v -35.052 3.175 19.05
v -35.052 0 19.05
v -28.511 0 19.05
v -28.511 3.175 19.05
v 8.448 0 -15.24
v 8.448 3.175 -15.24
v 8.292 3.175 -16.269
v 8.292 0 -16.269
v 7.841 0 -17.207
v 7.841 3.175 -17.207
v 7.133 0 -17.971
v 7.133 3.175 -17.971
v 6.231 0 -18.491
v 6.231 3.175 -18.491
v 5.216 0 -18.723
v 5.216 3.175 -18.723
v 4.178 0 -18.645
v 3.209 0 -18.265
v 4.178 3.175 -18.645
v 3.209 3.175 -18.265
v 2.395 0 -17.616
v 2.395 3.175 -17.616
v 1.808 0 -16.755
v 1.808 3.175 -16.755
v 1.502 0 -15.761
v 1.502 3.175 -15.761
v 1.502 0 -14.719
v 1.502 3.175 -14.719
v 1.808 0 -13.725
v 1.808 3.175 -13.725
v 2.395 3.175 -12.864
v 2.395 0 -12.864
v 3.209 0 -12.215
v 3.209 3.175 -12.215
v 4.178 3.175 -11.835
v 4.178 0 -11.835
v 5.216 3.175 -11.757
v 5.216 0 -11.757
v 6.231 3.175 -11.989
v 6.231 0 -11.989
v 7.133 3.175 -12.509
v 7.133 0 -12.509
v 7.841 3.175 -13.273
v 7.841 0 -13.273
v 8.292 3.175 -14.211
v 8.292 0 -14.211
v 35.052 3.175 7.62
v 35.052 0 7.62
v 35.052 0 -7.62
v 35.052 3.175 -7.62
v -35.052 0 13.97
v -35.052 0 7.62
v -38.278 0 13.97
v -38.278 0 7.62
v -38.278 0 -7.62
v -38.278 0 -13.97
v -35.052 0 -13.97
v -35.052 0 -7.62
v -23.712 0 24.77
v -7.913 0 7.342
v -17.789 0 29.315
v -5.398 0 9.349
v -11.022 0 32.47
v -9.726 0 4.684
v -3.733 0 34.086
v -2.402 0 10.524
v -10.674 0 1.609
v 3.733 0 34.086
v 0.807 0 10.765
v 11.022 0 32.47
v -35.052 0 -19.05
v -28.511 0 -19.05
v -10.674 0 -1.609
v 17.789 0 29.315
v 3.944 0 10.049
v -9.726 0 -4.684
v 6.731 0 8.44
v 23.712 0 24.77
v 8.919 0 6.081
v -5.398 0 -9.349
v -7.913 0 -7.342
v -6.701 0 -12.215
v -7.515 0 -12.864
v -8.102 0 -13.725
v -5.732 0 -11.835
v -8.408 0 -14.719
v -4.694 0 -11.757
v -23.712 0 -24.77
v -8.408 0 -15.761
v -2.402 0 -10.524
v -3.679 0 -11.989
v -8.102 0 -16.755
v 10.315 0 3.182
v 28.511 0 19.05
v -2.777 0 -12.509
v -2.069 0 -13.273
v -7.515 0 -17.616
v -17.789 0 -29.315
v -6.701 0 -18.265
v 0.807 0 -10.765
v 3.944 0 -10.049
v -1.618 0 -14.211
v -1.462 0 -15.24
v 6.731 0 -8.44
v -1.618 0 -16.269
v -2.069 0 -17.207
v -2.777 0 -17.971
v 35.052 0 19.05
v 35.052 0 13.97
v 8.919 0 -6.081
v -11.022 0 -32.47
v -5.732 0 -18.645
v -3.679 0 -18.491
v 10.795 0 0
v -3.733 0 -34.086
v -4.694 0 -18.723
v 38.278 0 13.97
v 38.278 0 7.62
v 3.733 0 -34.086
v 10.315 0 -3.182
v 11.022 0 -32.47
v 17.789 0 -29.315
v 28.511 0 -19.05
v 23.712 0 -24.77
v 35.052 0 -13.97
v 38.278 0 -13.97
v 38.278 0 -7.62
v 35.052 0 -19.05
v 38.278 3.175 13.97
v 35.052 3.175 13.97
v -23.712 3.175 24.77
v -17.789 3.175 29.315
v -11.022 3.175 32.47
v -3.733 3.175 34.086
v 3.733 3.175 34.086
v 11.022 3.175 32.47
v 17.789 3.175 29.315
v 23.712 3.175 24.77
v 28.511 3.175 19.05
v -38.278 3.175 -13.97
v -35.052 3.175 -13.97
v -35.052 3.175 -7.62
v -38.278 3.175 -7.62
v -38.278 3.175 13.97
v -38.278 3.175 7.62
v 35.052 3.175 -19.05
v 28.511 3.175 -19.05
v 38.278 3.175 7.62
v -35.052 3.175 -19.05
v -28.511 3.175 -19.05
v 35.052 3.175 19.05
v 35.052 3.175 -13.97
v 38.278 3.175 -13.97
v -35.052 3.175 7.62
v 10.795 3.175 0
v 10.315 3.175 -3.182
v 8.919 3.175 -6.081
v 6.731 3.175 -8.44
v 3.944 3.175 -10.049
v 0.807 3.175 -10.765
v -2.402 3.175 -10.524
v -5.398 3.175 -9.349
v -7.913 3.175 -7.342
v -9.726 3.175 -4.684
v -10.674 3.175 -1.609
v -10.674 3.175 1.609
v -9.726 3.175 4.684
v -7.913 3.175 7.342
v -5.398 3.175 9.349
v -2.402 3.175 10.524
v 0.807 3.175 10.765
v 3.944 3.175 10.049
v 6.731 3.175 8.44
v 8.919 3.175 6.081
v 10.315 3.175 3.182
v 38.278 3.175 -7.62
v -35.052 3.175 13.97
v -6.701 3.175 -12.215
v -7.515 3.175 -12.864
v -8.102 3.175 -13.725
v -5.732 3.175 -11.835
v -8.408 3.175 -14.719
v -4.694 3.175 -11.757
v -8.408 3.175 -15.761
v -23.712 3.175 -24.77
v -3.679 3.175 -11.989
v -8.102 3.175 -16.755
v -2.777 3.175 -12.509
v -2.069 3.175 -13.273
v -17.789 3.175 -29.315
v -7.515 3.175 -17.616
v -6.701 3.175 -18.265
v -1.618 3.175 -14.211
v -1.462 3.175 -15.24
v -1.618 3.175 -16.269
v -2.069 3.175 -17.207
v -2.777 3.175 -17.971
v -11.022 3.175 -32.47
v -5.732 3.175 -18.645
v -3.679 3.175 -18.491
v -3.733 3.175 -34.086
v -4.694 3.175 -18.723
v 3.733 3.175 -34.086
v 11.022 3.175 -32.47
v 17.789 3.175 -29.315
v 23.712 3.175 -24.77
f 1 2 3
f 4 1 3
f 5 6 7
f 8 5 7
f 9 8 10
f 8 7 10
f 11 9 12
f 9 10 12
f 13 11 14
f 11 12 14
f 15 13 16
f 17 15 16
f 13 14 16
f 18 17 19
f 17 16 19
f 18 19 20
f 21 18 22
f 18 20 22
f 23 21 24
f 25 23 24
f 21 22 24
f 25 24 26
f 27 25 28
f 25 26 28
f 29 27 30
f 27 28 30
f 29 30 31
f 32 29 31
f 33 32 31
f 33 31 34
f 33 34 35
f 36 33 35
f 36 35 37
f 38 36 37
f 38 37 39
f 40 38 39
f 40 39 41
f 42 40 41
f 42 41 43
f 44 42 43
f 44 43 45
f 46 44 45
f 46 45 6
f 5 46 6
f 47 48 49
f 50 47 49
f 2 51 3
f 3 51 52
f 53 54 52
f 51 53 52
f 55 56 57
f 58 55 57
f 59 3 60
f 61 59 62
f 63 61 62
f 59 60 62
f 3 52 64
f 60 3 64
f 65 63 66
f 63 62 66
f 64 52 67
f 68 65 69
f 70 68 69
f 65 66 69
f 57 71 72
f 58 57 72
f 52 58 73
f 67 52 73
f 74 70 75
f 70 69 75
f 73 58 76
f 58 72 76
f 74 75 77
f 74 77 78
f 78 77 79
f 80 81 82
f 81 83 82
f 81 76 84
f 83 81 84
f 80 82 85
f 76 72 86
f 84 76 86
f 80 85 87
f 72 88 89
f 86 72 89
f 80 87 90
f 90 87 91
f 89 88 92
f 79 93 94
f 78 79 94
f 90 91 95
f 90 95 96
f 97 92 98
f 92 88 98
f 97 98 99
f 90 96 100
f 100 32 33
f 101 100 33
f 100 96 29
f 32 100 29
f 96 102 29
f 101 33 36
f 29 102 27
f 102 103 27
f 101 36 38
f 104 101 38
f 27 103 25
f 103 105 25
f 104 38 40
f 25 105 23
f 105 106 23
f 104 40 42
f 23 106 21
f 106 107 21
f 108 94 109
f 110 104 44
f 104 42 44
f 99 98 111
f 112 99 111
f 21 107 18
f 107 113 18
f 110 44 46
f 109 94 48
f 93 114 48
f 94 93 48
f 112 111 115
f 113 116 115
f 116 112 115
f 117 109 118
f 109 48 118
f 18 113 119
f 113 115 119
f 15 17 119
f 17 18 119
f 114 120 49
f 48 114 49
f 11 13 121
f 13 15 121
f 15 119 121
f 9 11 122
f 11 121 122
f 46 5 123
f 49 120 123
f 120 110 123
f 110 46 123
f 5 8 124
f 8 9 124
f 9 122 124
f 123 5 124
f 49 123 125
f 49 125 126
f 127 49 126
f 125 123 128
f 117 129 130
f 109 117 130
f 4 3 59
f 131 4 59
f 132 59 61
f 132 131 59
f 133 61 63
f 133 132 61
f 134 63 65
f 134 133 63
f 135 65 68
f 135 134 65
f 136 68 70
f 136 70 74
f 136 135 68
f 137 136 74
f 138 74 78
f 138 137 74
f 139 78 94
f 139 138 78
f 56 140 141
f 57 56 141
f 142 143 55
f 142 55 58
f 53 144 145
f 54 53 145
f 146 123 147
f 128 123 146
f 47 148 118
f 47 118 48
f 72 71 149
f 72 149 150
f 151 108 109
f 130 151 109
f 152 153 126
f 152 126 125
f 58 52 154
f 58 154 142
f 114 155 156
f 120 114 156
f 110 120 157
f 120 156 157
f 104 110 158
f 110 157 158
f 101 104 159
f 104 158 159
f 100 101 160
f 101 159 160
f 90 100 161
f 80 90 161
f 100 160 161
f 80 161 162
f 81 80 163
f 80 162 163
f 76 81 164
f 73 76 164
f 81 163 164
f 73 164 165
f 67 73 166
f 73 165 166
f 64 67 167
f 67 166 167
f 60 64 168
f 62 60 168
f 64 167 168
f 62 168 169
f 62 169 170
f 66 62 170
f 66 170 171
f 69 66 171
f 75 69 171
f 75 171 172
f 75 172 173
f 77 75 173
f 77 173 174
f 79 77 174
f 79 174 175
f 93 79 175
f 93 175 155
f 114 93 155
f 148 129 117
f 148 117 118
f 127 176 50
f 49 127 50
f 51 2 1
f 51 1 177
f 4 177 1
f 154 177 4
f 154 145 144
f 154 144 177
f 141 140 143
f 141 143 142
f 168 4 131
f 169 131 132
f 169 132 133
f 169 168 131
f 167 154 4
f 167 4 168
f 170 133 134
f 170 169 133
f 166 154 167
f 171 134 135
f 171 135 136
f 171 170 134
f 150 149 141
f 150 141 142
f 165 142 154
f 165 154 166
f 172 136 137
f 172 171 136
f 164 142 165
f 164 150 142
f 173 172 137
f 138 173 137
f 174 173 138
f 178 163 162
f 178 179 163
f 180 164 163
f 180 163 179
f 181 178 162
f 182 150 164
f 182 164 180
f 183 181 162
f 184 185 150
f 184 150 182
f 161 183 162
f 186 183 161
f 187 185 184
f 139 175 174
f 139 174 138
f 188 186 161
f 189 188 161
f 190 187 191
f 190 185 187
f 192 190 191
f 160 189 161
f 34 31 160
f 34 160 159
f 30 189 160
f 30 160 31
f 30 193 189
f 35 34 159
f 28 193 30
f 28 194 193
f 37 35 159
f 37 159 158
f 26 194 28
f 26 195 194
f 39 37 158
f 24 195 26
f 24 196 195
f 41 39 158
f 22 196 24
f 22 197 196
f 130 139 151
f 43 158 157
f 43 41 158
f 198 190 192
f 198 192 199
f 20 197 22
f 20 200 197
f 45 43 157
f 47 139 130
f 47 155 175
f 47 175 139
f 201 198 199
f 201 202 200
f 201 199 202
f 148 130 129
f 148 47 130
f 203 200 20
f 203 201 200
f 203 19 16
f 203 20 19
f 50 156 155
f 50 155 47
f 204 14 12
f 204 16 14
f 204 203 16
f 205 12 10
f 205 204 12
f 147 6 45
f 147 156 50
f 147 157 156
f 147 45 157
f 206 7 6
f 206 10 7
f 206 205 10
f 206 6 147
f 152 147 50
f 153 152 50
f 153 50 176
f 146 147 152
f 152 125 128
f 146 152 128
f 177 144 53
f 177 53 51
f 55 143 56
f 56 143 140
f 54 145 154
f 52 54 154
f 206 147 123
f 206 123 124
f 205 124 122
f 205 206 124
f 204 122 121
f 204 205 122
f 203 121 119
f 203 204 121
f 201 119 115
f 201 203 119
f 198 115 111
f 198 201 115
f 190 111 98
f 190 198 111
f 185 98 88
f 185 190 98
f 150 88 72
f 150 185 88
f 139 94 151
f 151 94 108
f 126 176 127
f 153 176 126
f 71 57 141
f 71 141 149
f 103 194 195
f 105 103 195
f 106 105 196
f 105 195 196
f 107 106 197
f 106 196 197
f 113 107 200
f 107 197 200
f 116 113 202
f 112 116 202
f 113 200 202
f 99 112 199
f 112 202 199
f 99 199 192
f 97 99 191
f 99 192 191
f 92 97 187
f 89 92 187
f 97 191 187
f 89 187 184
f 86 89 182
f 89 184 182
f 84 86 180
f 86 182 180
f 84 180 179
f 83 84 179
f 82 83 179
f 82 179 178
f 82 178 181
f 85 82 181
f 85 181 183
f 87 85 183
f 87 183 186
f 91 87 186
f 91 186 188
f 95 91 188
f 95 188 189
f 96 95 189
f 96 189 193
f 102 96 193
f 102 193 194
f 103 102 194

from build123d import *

# Parameters (mm, degrees)
SKETCH1_W                  = 70.104
SKETCH1_H                  = 38.1
RECTANGULAR_BASE_DEPTH     = 3.175
SKETCH2_R                  = 34.29
CIRCULAR_BASE_ADD_ON_DEPTH = 3.175
SKETCH4_W                  = 3.2258
SKETCH4_H                  = 6.35
TAB_DEPTH                  = 3.175
SKETCH5_R                  = 10.795
CUT_EXTRUDE1_DEPTH         = 4.175
SKETCH6_R                  = 3.4925
CUT_FOR_SCREW_ACCESS_DEPTH = 4.175


with BuildPart() as part:
    # Sketch1 → rectangular base (new body)
    with BuildSketch(Plane(origin=(0, 0, 0), x_dir=(1, 0, 0), z_dir=(0, 1, 0))):
        Rectangle(SKETCH1_W, SKETCH1_H)
    extrude(amount=RECTANGULAR_BASE_DEPTH)

    # Sketch2 → circular base add on (add)
    with BuildSketch(Plane(origin=(0, 3.175, 0), x_dir=(1, 0, 0), z_dir=(0, 1, 0))):
        Circle(SKETCH2_R)
    extrude(amount=-CIRCULAR_BASE_ADD_ON_DEPTH)

    # Sketch4 → tab (add)
    with BuildSketch(Plane(origin=(0, 3.175, 0), x_dir=(1, 0, 0), z_dir=(0, 1, 0))):
        with Locations((-36.6649, 10.795)):
            Rectangle(SKETCH4_W, SKETCH4_H)
        with Locations((-36.6649, -10.795)):
            Rectangle(SKETCH4_W, SKETCH4_H)
    tab = extrude(amount=-TAB_DEPTH)

    # Mirror1: tab across plane
    add(tab.mirror(Plane(origin=(0, 0, 0), x_dir=(0, 0, 1), z_dir=(1, 0, 0))))

    # Sketch5 → Cut-Extrude1 (cut, through all)
    with BuildSketch(Plane(origin=(0, 3.175, 0), x_dir=(1, 0, 0), z_dir=(0, 1, 0))):
        Circle(SKETCH5_R)
    extrude(amount=-CUT_EXTRUDE1_DEPTH, mode=Mode.SUBTRACT)

    # Sketch6 → cut for screw access (cut, through all)
    with BuildSketch(Plane(origin=(0, 3.175, 0), x_dir=(1, 0, 0), z_dir=(0, 1, 0))):
        with Locations((4.955, 15.24)):
            Circle(SKETCH6_R)
        with Locations((-4.955, 15.24)):
            Circle(SKETCH6_R)
    extrude(amount=-CUT_FOR_SCREW_ACCESS_DEPTH, mode=Mode.SUBTRACT)


solid = part.part
